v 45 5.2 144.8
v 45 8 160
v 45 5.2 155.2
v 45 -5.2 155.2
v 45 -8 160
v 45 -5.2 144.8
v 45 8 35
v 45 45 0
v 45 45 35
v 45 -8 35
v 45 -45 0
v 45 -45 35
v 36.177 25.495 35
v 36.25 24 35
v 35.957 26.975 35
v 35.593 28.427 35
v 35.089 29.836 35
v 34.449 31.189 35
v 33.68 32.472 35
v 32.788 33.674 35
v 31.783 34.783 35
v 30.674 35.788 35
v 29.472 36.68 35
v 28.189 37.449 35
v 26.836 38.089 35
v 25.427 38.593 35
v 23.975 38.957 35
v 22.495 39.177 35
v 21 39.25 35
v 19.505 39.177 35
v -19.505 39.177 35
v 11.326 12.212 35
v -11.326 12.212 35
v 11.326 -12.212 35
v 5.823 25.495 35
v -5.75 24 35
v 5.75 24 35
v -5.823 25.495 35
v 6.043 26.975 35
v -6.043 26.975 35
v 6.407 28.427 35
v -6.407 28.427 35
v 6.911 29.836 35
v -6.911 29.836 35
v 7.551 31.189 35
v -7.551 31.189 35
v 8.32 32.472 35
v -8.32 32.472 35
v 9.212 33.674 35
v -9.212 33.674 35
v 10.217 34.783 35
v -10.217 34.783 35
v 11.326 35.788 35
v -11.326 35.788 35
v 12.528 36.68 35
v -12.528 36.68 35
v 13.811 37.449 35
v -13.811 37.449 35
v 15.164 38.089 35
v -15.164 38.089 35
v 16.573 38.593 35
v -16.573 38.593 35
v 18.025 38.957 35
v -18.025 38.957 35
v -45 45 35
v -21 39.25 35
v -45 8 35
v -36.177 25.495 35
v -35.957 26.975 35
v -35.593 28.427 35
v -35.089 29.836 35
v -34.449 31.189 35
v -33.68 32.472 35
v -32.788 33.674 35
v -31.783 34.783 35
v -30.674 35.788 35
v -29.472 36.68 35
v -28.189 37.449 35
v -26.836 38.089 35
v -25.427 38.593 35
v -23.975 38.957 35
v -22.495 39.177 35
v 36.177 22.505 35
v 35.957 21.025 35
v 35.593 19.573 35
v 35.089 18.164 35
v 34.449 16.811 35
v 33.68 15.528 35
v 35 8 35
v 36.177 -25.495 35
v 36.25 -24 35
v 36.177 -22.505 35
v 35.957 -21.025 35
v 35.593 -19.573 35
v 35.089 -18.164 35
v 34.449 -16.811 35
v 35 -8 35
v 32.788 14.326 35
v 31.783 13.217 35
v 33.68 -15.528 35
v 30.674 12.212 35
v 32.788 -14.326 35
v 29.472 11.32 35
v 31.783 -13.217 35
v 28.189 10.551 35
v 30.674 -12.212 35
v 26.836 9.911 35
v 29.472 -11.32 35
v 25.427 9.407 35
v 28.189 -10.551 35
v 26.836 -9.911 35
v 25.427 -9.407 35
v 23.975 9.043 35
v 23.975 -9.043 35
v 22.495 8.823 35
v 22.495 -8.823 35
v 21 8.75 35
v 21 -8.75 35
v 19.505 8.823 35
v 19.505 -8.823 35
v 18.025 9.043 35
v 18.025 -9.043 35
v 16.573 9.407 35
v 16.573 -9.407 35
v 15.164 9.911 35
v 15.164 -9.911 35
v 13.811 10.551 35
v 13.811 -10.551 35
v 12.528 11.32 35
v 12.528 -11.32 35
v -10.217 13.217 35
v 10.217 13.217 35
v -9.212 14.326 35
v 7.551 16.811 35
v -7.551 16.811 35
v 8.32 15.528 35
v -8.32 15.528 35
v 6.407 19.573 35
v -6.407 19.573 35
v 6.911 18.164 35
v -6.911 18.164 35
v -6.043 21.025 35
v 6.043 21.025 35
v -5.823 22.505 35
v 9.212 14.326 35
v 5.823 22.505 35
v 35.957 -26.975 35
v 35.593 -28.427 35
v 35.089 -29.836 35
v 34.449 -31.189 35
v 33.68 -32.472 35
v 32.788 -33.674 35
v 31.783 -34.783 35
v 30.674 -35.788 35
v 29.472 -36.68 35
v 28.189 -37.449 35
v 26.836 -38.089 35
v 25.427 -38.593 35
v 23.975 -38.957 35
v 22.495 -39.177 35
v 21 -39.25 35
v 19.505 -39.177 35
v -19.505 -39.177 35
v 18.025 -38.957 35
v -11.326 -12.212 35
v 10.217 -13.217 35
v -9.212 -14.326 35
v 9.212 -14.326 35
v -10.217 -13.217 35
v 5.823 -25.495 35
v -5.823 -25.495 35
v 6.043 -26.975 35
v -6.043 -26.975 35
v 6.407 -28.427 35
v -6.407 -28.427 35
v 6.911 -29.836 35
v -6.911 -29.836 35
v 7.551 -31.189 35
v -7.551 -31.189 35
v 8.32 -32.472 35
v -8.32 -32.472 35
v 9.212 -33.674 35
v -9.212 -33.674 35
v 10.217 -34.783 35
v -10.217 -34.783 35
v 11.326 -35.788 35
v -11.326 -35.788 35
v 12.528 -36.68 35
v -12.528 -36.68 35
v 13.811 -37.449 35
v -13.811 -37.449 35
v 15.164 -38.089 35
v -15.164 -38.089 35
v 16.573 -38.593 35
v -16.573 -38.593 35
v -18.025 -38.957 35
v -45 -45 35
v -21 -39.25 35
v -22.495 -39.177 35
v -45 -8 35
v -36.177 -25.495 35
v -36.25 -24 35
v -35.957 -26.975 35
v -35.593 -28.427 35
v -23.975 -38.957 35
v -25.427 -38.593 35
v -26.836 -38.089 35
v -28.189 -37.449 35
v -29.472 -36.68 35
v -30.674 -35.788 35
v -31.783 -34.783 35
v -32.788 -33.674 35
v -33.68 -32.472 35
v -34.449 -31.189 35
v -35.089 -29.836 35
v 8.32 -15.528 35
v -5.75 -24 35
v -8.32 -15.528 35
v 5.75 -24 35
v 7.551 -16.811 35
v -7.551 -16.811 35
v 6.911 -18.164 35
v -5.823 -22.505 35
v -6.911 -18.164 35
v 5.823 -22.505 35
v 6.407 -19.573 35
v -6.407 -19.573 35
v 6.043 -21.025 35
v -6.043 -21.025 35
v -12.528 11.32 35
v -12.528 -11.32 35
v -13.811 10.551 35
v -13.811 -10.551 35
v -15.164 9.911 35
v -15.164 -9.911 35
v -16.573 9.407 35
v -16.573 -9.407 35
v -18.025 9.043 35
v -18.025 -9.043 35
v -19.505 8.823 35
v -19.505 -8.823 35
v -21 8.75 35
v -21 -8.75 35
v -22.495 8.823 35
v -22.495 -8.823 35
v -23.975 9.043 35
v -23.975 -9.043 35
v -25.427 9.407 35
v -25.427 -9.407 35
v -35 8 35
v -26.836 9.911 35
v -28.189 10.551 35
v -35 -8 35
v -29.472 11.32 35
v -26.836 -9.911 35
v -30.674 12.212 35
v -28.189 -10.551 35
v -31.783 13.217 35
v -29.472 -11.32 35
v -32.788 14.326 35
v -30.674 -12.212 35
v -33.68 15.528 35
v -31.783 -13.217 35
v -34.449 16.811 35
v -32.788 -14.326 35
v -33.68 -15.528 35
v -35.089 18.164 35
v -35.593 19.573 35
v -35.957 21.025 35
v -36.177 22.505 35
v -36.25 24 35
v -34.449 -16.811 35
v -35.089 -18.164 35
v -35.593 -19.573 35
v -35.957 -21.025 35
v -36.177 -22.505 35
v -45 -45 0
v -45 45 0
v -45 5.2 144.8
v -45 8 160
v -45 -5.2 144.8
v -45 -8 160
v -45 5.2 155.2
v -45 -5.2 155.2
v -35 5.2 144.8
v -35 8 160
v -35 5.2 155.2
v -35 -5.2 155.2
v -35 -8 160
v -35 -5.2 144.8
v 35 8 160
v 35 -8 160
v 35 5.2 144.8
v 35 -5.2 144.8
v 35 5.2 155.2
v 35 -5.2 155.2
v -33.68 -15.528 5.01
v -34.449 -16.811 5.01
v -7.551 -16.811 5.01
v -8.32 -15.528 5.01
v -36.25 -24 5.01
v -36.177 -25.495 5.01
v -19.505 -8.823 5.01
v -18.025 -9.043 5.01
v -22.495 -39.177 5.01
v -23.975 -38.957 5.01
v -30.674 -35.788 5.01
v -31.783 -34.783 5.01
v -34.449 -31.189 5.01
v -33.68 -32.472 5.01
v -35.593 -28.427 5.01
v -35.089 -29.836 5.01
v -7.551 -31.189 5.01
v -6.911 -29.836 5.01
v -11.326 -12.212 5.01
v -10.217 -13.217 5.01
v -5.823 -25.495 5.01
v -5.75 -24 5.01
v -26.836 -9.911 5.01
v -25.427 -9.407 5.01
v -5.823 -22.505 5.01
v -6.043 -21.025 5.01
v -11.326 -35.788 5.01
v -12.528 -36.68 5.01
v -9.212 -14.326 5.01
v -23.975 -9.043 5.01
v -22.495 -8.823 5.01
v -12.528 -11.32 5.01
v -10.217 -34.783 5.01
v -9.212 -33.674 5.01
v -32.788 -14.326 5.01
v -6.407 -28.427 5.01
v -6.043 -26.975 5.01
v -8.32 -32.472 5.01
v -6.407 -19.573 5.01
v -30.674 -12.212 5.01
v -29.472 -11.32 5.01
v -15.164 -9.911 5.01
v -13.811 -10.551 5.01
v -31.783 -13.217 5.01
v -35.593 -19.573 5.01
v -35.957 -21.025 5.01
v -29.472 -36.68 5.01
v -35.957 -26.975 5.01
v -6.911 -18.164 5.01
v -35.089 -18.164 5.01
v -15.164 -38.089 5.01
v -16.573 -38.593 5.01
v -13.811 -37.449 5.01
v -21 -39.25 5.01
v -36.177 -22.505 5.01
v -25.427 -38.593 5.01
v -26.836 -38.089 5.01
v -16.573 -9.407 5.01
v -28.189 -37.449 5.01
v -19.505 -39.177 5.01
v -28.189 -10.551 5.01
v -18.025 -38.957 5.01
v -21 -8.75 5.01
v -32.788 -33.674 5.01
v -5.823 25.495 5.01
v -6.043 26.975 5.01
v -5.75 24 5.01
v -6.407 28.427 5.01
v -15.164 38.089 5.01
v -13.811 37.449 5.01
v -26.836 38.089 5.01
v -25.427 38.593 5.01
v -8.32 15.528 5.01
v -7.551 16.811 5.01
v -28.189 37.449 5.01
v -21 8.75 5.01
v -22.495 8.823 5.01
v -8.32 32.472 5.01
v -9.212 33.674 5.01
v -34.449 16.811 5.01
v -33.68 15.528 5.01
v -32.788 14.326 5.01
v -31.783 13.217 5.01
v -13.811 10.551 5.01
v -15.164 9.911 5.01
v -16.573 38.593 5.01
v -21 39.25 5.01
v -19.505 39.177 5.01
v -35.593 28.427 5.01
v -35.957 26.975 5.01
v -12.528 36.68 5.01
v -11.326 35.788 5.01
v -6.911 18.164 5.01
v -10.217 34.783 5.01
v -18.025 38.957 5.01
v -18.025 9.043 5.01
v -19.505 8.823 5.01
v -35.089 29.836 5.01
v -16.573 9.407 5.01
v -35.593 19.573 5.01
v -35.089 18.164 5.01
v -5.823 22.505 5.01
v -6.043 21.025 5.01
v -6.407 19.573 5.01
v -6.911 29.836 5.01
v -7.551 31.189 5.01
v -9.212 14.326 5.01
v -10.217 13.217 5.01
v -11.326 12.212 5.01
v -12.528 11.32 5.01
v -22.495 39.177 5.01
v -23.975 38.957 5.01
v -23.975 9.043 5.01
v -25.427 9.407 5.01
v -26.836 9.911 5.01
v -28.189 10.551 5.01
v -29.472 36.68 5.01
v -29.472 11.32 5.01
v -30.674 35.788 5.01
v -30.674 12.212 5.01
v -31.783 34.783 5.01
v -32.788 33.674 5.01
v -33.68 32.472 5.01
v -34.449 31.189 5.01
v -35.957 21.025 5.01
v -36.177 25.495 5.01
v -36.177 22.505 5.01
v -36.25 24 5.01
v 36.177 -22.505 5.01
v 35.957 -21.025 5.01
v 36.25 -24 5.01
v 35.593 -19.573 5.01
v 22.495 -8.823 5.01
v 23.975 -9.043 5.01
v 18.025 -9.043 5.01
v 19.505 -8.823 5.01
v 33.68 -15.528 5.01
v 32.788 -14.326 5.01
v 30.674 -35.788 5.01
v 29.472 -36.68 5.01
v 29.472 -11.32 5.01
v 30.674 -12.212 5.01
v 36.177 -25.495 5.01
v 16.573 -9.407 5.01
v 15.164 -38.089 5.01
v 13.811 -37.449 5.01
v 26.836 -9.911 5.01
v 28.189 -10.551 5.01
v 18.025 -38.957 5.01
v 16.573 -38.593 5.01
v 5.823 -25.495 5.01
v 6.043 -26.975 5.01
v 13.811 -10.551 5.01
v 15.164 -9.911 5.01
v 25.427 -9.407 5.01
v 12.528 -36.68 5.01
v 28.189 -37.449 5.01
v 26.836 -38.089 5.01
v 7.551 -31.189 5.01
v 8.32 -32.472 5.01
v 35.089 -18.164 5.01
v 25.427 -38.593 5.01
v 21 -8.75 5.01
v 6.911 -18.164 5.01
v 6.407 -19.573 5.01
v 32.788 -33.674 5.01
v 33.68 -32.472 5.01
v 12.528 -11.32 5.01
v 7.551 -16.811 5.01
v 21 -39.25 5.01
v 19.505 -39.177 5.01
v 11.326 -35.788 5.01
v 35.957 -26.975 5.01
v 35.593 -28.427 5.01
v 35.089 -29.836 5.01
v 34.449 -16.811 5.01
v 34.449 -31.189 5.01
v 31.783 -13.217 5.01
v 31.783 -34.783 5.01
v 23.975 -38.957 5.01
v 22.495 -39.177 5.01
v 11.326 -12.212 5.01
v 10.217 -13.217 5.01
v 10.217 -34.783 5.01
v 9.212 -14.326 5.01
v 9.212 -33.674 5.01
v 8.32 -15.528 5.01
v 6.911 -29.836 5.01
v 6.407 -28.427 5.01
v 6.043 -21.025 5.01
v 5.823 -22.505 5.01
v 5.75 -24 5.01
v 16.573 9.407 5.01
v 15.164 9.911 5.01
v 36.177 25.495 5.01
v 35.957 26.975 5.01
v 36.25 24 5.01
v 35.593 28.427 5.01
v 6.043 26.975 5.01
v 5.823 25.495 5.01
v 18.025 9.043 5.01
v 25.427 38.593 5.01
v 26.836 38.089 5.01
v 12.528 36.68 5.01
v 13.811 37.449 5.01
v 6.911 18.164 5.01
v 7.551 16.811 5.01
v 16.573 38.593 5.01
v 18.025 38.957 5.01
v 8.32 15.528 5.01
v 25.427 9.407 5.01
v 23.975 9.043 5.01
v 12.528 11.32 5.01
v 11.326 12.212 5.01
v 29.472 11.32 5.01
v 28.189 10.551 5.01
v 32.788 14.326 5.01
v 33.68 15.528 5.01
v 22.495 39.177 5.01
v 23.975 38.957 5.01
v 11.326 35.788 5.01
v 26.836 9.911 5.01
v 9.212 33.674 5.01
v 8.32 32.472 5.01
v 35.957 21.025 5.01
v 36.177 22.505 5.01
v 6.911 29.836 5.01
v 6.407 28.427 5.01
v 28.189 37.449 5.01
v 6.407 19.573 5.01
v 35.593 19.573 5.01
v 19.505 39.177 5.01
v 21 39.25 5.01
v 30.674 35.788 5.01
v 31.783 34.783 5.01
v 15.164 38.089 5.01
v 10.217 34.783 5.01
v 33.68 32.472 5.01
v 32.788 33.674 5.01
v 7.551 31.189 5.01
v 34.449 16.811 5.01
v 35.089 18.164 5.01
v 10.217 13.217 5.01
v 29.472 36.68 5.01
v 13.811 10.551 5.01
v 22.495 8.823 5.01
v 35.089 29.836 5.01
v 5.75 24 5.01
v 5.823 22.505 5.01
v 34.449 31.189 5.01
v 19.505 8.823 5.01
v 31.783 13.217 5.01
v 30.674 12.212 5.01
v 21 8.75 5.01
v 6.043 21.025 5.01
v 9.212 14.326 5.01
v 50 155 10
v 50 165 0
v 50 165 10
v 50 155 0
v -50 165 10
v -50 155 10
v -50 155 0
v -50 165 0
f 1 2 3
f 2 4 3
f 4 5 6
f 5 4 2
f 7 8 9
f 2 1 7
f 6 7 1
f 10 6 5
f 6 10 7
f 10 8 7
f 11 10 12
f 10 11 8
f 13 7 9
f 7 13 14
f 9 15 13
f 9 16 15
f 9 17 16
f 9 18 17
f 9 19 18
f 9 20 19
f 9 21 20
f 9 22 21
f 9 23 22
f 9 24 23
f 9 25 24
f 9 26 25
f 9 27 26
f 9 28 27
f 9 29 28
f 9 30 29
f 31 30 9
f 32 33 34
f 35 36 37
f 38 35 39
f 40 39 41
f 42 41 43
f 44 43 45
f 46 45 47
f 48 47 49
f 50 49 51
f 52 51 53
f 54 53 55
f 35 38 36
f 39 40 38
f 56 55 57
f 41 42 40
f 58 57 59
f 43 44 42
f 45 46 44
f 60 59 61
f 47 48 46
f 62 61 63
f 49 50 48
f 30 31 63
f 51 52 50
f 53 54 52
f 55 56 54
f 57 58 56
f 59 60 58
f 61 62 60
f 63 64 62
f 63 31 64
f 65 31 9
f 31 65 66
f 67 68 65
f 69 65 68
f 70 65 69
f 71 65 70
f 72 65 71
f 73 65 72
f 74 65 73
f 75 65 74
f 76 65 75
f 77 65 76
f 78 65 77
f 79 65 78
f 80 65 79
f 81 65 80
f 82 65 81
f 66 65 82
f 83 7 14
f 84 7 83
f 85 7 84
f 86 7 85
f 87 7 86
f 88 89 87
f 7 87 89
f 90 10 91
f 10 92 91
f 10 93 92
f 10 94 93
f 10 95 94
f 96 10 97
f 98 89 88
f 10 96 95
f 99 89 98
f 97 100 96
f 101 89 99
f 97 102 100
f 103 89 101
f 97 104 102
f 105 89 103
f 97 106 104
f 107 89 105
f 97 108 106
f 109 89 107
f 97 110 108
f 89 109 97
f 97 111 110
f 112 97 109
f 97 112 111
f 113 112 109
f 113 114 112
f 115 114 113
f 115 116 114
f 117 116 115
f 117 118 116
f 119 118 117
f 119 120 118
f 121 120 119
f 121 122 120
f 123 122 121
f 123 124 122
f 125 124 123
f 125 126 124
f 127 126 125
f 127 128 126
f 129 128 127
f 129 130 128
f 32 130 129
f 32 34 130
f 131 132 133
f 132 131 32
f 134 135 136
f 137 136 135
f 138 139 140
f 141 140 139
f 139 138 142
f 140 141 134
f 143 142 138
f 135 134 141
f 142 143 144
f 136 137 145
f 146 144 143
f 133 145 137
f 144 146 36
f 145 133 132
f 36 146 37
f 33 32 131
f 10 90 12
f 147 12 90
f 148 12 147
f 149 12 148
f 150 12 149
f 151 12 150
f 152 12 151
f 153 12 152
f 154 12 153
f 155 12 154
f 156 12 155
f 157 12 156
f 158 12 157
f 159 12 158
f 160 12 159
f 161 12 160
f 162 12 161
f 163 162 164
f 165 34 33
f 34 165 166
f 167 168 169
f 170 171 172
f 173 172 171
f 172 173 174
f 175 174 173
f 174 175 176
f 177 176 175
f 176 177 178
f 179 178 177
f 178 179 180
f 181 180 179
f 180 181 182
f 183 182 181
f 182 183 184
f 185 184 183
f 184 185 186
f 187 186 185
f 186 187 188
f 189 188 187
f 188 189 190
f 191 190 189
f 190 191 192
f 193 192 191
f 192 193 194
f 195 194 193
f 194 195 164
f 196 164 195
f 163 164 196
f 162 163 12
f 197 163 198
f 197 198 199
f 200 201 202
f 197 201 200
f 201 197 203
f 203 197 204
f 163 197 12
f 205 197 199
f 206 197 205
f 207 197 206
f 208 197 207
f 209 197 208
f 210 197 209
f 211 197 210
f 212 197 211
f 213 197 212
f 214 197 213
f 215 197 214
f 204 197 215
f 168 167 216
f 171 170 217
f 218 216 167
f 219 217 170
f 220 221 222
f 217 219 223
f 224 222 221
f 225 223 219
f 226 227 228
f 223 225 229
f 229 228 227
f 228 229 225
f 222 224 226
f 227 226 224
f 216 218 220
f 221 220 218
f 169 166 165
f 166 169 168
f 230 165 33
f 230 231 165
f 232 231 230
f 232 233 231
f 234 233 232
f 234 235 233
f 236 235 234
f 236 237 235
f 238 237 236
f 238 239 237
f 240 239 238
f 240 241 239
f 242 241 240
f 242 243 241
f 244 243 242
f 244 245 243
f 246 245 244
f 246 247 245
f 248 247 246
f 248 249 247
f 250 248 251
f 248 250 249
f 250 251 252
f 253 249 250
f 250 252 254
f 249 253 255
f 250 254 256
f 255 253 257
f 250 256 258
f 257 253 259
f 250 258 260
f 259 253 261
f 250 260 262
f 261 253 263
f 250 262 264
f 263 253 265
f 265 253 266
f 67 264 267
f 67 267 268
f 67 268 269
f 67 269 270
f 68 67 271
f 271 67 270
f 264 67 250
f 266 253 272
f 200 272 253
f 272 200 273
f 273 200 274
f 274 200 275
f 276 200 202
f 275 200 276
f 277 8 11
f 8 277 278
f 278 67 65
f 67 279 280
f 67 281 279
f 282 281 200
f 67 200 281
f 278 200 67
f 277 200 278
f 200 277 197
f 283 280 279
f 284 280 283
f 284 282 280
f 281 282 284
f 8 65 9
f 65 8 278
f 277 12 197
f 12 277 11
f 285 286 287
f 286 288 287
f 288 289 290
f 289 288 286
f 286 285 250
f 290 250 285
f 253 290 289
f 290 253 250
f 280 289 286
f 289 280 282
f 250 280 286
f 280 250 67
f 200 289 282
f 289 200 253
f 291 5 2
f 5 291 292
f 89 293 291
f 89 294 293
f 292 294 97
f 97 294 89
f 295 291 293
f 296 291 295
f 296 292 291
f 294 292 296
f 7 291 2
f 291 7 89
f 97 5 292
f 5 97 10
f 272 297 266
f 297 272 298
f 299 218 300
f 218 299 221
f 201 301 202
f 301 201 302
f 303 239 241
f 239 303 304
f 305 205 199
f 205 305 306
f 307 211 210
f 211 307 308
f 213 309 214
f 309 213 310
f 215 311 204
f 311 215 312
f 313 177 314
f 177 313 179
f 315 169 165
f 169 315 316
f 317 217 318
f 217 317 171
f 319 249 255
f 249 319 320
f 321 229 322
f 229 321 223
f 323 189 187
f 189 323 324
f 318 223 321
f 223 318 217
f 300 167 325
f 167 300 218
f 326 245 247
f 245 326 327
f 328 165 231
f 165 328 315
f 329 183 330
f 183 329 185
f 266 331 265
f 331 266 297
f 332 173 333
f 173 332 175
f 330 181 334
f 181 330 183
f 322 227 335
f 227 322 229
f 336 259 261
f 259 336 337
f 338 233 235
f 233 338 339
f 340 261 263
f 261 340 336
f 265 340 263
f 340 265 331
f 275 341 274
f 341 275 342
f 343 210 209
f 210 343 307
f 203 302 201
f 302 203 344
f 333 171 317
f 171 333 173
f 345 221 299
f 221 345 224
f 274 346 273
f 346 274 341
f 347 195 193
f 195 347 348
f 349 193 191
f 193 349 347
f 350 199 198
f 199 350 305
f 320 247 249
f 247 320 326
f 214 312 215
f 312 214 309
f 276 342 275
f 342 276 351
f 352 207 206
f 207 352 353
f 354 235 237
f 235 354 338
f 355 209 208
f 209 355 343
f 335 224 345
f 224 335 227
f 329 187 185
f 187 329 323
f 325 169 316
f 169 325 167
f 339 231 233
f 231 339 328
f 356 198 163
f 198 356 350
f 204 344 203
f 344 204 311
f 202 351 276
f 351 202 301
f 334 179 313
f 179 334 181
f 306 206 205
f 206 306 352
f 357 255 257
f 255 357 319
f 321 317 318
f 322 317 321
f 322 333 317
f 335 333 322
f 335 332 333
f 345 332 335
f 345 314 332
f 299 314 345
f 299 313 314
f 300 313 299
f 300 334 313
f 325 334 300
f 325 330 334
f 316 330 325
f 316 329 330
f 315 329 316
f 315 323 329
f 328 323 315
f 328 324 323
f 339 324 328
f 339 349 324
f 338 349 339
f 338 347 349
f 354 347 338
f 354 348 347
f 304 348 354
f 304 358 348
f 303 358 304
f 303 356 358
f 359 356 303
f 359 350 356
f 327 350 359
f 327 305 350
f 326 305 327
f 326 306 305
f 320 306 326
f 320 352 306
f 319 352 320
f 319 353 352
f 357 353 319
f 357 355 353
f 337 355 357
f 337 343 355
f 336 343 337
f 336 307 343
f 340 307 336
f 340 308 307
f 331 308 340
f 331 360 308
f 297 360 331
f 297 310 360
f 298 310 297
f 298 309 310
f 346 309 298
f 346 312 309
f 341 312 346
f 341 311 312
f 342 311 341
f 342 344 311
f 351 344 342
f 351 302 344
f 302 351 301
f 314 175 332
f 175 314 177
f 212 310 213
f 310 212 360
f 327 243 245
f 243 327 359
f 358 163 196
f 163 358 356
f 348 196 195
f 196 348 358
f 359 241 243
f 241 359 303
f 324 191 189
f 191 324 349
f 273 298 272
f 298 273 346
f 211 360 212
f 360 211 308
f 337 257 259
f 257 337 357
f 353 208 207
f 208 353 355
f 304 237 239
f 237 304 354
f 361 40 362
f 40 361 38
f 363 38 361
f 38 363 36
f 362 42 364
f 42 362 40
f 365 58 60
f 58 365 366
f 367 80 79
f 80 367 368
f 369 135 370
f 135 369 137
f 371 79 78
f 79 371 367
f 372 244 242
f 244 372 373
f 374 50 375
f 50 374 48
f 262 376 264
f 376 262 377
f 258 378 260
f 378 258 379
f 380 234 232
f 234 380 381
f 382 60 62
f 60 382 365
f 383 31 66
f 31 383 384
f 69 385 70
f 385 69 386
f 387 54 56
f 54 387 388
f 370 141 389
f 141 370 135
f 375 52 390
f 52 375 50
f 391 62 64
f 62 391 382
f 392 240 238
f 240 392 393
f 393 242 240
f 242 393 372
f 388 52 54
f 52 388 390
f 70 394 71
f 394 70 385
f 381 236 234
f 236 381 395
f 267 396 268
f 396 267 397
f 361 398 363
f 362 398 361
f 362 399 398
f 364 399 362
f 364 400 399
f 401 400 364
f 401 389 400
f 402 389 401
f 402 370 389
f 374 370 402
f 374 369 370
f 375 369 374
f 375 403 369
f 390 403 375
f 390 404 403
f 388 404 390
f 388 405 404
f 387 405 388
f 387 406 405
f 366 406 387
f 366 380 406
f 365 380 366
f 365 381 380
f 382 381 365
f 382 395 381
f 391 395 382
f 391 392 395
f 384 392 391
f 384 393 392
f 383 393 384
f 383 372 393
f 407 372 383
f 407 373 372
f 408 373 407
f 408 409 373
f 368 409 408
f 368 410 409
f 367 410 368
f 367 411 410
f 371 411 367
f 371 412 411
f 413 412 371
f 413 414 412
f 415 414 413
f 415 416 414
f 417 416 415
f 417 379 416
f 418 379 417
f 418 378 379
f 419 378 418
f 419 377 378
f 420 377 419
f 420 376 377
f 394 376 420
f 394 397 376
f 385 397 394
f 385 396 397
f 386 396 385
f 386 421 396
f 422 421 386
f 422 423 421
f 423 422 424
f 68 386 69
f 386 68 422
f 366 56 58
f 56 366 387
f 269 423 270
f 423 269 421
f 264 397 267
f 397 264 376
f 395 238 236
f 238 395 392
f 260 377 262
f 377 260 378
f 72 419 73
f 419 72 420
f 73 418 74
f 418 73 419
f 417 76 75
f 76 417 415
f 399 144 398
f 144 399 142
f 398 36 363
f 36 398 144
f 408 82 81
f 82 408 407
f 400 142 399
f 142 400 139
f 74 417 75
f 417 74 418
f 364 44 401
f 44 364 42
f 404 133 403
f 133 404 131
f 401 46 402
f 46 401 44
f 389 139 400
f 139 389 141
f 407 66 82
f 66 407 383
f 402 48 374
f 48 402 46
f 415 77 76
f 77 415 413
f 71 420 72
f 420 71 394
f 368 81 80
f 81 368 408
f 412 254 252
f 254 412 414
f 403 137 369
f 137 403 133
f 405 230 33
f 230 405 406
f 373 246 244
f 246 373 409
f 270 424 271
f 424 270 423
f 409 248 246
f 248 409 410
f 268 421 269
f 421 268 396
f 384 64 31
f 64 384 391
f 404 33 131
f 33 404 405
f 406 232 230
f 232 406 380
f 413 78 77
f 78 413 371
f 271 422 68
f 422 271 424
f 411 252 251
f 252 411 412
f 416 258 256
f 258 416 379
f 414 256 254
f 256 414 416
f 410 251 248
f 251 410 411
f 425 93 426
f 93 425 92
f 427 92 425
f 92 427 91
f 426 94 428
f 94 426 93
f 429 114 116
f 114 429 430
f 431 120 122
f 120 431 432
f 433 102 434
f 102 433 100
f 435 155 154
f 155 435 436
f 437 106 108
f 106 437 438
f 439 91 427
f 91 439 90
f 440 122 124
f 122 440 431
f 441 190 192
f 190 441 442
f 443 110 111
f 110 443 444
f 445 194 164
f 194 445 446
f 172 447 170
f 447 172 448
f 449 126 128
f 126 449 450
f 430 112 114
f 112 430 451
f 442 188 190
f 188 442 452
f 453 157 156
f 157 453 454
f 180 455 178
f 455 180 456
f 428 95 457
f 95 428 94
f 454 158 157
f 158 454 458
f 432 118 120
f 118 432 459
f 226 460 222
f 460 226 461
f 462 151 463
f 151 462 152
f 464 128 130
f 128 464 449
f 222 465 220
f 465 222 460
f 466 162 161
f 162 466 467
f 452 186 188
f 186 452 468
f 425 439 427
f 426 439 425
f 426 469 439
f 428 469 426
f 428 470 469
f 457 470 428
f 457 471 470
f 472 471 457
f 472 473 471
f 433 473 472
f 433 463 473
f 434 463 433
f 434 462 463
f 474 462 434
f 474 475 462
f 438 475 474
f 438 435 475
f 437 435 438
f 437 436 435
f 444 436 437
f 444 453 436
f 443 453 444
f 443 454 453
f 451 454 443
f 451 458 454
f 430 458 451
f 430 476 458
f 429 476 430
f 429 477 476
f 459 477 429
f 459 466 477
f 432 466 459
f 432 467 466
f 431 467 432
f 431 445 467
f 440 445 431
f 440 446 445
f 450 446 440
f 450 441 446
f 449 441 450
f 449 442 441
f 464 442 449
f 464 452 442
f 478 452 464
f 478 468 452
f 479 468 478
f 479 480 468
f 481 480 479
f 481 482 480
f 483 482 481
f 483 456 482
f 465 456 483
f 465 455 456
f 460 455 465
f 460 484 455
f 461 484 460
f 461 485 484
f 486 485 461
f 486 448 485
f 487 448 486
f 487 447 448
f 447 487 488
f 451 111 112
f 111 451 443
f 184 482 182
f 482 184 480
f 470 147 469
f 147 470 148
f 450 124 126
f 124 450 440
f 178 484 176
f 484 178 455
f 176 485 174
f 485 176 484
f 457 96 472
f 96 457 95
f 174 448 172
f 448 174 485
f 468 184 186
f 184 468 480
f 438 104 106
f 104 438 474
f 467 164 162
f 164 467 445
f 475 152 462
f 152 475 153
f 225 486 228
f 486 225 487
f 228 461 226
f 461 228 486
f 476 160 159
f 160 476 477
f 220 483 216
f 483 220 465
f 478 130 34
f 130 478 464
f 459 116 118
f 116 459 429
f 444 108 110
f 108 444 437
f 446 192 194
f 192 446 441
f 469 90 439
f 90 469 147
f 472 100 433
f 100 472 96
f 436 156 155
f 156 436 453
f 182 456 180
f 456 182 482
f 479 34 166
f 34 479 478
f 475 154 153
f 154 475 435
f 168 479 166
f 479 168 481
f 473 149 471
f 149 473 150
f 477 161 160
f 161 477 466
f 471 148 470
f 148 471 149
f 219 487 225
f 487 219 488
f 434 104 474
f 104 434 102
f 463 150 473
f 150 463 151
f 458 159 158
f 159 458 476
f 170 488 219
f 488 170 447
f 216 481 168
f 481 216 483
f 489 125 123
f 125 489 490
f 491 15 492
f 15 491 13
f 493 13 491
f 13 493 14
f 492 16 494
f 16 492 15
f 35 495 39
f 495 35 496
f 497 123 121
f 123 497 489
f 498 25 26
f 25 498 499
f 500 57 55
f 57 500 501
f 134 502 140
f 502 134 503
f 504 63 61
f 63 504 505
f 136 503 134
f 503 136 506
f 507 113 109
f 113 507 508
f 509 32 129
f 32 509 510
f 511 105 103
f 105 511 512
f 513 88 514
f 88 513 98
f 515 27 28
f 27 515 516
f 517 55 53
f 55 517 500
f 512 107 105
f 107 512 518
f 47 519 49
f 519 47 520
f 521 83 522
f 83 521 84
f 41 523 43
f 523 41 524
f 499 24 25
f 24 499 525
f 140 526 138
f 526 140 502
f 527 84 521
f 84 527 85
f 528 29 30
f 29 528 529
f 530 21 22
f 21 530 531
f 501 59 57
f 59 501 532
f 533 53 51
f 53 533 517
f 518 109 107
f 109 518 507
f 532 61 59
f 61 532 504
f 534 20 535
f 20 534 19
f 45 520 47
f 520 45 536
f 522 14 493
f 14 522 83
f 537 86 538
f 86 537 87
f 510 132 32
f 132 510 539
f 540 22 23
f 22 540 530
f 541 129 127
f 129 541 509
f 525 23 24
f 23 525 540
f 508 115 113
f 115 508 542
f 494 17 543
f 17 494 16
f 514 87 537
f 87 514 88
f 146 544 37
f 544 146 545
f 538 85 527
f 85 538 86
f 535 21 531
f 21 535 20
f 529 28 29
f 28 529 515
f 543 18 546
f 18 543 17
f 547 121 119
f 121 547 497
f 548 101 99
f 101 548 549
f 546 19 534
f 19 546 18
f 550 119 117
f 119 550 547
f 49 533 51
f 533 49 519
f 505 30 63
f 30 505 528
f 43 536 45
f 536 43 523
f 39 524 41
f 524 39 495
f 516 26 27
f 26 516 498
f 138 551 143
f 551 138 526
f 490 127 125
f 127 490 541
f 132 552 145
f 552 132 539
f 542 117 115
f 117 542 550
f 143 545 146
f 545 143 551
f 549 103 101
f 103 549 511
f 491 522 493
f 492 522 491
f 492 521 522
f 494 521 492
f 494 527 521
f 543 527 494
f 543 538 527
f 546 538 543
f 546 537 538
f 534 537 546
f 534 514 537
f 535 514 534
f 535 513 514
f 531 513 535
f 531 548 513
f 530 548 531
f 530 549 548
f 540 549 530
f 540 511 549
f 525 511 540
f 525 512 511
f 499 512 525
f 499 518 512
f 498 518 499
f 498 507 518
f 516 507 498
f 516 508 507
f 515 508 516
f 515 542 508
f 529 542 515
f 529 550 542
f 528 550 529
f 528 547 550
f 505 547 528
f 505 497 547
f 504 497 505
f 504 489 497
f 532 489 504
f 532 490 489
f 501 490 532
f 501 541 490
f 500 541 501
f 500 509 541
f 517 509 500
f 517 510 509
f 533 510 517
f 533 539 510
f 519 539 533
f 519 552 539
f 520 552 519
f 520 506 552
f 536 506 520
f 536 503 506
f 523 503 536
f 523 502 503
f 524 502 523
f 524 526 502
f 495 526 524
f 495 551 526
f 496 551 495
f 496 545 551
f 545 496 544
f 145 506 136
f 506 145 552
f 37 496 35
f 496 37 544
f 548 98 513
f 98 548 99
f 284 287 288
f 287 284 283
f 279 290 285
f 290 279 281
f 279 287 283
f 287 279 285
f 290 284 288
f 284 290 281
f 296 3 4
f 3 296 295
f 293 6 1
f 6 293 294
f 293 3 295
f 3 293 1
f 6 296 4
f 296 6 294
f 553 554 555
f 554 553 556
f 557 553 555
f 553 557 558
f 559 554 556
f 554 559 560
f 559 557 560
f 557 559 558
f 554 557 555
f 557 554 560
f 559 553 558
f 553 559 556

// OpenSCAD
// Part 1: Base block with tube seats and vertical posts
// Part 2: Handle bar to be slid through the posts

// --- Dimensions Part 1 ---
base_x      = 90;    // Base length (X)
base_y      = 90;    // Base width (Y)
base_z      = 35;    // Base height (Z)

seat_d      = 30.5;  // Diameter of tube seats
seat_depth  = 30;    // Depth of tube seats
seat_floor  = 5;     // Remaining floor thickness (35 - 30)

seat_x_pos  = 21;    // X offset for seats
seat_y_pos  = 24;    // Y offset for seats

post_x_thick = 10;   // Thickness of posts (X dimension)
post_y_wide  = 16;   // Width of posts (Y dimension)
post_z_total  = 160; // Total height from Z=0

hole_sq_d    = 10.4; // Square hole dimension
hole_sq_z    = 150;  // Z height of the square hole center

// --- Dimensions Part 2 ---
handle_x     = 100;  // Length of handle (X)
handle_w     = 10;   // Width of handle (Y)
handle_h     = 10;   // Height of handle (Z)
handle_y_min  = 55;  // Y position start (55 to 65)
handle_y_max  = 65;

$fn = 64;

// --- Part 1: Base and Posts ---
module part_1() {
    difference() {
        union() {
            // Main Base Block
            translate([-base_x/2, -base_y/2, 0])
                cube([base_x, base_y, base_z]);
            
            // Post 1 (at -X end)
            // Positioned flush with end faces: X from -45 to -35
            translate([-base_x/2, -post_y_wide/2, base_z])
                cube([post_x_thick, post_y_wide, post_z_total - base_z]);
            
            // Post 2 (at +X end)
            // Positioned flush with end faces: X from 35 to 45
            translate([base_x/2 - post_x_thick, -post_y_wide/2, base_z])
                cube([post_x_thick, post_y_wide, post_z_total - base_z]);
        }

        // Tube Seats (Blind holes)
        // Seats are centered at x = +/- 21, y = +/- 24
        for (sx = [-seat_x_pos, seat_x_pos]) {
            for (sy = [-seat_y_pos, seat_y_pos]) {
                // Subtract 0.01 to ensure clean cut through the top face
                translate([sx, sy, base_z - seat_depth + 0.01])
                    cylinder(h = seat_depth + 0.01, d = seat_d);
            }
        }

        // Square holes through posts
        // Centered at z = 150.
        // Post 1 X range: [-45, -35]. Post 2 X range: [35, 45].
        // We use a large cube to ensure it cuts through the posts completely.
        
        // Hole 1 (Left Post)
        translate([-base_x/2 - 1, -hole_sq_d/2, hole_sq_z - hole_sq_d/2])
            cube([post_x_thick + 2, hole_sq_d, hole_sq_d]);
            
        // Hole 2 (Right Post)
        translate([base_x/2 - post_x_thick - 1, -hole_sq_d/2, hole_sq_z - hole_sq_d/2])
            cube([post_x_thick + 2, hole_sq_d, hole_sq_d]);
    }
}

// --- Part 2: Handle ---
module part_2() {
    // The handle is a 10x10x100 bar.
    // Centered on X (0), and spans Y from 55 to 65.
    // It lies on the bed (Z=0).
    translate([-handle_x/2, handle_y_min, 0])
        cube([handle_x, handle_w, handle_h]);
}

// --- Rendering ---
// Render Part 1
part_1();

// Render Part 2 (Offset for visibility)
translate([0, 100, 0]) part_2();
